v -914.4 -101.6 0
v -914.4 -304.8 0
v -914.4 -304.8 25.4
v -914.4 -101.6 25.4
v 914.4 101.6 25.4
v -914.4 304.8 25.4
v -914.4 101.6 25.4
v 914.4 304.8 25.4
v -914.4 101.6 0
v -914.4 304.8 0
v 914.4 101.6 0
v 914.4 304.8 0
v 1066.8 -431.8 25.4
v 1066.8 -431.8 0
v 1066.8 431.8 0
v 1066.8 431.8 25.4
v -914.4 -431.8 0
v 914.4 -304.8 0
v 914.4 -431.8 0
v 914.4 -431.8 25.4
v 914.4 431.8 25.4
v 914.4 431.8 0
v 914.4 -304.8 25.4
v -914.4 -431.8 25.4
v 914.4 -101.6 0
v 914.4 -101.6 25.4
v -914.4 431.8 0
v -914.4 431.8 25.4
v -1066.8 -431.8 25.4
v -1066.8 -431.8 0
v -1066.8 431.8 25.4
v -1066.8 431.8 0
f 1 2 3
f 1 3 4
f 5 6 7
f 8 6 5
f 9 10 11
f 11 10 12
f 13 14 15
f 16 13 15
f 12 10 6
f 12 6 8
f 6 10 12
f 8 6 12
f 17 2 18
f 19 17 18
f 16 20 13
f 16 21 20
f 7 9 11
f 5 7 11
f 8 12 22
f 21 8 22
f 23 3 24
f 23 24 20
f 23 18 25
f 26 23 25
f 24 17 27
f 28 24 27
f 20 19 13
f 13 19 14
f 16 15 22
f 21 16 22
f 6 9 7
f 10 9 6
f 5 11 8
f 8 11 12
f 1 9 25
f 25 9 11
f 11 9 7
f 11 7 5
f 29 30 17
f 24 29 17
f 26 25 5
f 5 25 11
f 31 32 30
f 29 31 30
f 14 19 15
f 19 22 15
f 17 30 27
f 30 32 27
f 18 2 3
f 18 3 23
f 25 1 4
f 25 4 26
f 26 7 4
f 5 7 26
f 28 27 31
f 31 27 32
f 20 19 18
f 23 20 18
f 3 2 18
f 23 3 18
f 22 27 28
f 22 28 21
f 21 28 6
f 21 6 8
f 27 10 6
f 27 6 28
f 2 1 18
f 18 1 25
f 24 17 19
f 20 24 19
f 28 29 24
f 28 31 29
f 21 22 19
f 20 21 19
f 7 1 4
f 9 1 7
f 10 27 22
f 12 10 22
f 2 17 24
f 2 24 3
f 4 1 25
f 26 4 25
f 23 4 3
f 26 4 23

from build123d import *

# Parameters (mm, degrees)
F1_DEPTH = 25.4
F0_W     = 1828.8
F0_H     = 127
F0_H_2   = 203.2
F2_DEPTH = 25.4
F3_DEPTH = 25.4


with BuildPart() as f1:
    # F0 (on Top) → F1 (new body)
    with BuildSketch(Plane.XY):
        Polygon((-1066.8, -431.8), (-914.4, -431.8), (-914.4, -304.8), (-914.4, -101.6), (-914.4, 101.6), (-914.4, 304.8), (-914.4, 431.8), (-1066.8, 431.8), align=None)
        Polygon((914.4, -431.8), (1066.8, -431.8), (1066.8, 431.8), (914.4, 431.8), (914.4, 304.8), (914.4, 101.6), (914.4, -101.6), (914.4, -304.8), align=None)
    extrude(amount=F1_DEPTH)


with BuildPart() as f2:
    # F0 (on Top) → F2 (new body)
    with BuildSketch(Plane.XY):
        with Locations((0, 368.3)):
            Rectangle(F0_W, F0_H)
        Rectangle(F0_W, F0_H_2)
        with Locations((0, -368.3)):
            Rectangle(F0_W, F0_H)
    extrude(amount=F2_DEPTH)


with BuildPart() as f3:
    # F0 (on Top) → F3 (new body)
    with BuildSketch(Plane.XY):
        with Locations((0, 203.2)):
            Rectangle(F0_W, F0_H_2)
        with Locations((0, -203.2)):
            Rectangle(F0_W, F0_H_2)
    extrude(amount=F3_DEPTH)


solid = Compound([f1.part, f2.part, f3.part])
